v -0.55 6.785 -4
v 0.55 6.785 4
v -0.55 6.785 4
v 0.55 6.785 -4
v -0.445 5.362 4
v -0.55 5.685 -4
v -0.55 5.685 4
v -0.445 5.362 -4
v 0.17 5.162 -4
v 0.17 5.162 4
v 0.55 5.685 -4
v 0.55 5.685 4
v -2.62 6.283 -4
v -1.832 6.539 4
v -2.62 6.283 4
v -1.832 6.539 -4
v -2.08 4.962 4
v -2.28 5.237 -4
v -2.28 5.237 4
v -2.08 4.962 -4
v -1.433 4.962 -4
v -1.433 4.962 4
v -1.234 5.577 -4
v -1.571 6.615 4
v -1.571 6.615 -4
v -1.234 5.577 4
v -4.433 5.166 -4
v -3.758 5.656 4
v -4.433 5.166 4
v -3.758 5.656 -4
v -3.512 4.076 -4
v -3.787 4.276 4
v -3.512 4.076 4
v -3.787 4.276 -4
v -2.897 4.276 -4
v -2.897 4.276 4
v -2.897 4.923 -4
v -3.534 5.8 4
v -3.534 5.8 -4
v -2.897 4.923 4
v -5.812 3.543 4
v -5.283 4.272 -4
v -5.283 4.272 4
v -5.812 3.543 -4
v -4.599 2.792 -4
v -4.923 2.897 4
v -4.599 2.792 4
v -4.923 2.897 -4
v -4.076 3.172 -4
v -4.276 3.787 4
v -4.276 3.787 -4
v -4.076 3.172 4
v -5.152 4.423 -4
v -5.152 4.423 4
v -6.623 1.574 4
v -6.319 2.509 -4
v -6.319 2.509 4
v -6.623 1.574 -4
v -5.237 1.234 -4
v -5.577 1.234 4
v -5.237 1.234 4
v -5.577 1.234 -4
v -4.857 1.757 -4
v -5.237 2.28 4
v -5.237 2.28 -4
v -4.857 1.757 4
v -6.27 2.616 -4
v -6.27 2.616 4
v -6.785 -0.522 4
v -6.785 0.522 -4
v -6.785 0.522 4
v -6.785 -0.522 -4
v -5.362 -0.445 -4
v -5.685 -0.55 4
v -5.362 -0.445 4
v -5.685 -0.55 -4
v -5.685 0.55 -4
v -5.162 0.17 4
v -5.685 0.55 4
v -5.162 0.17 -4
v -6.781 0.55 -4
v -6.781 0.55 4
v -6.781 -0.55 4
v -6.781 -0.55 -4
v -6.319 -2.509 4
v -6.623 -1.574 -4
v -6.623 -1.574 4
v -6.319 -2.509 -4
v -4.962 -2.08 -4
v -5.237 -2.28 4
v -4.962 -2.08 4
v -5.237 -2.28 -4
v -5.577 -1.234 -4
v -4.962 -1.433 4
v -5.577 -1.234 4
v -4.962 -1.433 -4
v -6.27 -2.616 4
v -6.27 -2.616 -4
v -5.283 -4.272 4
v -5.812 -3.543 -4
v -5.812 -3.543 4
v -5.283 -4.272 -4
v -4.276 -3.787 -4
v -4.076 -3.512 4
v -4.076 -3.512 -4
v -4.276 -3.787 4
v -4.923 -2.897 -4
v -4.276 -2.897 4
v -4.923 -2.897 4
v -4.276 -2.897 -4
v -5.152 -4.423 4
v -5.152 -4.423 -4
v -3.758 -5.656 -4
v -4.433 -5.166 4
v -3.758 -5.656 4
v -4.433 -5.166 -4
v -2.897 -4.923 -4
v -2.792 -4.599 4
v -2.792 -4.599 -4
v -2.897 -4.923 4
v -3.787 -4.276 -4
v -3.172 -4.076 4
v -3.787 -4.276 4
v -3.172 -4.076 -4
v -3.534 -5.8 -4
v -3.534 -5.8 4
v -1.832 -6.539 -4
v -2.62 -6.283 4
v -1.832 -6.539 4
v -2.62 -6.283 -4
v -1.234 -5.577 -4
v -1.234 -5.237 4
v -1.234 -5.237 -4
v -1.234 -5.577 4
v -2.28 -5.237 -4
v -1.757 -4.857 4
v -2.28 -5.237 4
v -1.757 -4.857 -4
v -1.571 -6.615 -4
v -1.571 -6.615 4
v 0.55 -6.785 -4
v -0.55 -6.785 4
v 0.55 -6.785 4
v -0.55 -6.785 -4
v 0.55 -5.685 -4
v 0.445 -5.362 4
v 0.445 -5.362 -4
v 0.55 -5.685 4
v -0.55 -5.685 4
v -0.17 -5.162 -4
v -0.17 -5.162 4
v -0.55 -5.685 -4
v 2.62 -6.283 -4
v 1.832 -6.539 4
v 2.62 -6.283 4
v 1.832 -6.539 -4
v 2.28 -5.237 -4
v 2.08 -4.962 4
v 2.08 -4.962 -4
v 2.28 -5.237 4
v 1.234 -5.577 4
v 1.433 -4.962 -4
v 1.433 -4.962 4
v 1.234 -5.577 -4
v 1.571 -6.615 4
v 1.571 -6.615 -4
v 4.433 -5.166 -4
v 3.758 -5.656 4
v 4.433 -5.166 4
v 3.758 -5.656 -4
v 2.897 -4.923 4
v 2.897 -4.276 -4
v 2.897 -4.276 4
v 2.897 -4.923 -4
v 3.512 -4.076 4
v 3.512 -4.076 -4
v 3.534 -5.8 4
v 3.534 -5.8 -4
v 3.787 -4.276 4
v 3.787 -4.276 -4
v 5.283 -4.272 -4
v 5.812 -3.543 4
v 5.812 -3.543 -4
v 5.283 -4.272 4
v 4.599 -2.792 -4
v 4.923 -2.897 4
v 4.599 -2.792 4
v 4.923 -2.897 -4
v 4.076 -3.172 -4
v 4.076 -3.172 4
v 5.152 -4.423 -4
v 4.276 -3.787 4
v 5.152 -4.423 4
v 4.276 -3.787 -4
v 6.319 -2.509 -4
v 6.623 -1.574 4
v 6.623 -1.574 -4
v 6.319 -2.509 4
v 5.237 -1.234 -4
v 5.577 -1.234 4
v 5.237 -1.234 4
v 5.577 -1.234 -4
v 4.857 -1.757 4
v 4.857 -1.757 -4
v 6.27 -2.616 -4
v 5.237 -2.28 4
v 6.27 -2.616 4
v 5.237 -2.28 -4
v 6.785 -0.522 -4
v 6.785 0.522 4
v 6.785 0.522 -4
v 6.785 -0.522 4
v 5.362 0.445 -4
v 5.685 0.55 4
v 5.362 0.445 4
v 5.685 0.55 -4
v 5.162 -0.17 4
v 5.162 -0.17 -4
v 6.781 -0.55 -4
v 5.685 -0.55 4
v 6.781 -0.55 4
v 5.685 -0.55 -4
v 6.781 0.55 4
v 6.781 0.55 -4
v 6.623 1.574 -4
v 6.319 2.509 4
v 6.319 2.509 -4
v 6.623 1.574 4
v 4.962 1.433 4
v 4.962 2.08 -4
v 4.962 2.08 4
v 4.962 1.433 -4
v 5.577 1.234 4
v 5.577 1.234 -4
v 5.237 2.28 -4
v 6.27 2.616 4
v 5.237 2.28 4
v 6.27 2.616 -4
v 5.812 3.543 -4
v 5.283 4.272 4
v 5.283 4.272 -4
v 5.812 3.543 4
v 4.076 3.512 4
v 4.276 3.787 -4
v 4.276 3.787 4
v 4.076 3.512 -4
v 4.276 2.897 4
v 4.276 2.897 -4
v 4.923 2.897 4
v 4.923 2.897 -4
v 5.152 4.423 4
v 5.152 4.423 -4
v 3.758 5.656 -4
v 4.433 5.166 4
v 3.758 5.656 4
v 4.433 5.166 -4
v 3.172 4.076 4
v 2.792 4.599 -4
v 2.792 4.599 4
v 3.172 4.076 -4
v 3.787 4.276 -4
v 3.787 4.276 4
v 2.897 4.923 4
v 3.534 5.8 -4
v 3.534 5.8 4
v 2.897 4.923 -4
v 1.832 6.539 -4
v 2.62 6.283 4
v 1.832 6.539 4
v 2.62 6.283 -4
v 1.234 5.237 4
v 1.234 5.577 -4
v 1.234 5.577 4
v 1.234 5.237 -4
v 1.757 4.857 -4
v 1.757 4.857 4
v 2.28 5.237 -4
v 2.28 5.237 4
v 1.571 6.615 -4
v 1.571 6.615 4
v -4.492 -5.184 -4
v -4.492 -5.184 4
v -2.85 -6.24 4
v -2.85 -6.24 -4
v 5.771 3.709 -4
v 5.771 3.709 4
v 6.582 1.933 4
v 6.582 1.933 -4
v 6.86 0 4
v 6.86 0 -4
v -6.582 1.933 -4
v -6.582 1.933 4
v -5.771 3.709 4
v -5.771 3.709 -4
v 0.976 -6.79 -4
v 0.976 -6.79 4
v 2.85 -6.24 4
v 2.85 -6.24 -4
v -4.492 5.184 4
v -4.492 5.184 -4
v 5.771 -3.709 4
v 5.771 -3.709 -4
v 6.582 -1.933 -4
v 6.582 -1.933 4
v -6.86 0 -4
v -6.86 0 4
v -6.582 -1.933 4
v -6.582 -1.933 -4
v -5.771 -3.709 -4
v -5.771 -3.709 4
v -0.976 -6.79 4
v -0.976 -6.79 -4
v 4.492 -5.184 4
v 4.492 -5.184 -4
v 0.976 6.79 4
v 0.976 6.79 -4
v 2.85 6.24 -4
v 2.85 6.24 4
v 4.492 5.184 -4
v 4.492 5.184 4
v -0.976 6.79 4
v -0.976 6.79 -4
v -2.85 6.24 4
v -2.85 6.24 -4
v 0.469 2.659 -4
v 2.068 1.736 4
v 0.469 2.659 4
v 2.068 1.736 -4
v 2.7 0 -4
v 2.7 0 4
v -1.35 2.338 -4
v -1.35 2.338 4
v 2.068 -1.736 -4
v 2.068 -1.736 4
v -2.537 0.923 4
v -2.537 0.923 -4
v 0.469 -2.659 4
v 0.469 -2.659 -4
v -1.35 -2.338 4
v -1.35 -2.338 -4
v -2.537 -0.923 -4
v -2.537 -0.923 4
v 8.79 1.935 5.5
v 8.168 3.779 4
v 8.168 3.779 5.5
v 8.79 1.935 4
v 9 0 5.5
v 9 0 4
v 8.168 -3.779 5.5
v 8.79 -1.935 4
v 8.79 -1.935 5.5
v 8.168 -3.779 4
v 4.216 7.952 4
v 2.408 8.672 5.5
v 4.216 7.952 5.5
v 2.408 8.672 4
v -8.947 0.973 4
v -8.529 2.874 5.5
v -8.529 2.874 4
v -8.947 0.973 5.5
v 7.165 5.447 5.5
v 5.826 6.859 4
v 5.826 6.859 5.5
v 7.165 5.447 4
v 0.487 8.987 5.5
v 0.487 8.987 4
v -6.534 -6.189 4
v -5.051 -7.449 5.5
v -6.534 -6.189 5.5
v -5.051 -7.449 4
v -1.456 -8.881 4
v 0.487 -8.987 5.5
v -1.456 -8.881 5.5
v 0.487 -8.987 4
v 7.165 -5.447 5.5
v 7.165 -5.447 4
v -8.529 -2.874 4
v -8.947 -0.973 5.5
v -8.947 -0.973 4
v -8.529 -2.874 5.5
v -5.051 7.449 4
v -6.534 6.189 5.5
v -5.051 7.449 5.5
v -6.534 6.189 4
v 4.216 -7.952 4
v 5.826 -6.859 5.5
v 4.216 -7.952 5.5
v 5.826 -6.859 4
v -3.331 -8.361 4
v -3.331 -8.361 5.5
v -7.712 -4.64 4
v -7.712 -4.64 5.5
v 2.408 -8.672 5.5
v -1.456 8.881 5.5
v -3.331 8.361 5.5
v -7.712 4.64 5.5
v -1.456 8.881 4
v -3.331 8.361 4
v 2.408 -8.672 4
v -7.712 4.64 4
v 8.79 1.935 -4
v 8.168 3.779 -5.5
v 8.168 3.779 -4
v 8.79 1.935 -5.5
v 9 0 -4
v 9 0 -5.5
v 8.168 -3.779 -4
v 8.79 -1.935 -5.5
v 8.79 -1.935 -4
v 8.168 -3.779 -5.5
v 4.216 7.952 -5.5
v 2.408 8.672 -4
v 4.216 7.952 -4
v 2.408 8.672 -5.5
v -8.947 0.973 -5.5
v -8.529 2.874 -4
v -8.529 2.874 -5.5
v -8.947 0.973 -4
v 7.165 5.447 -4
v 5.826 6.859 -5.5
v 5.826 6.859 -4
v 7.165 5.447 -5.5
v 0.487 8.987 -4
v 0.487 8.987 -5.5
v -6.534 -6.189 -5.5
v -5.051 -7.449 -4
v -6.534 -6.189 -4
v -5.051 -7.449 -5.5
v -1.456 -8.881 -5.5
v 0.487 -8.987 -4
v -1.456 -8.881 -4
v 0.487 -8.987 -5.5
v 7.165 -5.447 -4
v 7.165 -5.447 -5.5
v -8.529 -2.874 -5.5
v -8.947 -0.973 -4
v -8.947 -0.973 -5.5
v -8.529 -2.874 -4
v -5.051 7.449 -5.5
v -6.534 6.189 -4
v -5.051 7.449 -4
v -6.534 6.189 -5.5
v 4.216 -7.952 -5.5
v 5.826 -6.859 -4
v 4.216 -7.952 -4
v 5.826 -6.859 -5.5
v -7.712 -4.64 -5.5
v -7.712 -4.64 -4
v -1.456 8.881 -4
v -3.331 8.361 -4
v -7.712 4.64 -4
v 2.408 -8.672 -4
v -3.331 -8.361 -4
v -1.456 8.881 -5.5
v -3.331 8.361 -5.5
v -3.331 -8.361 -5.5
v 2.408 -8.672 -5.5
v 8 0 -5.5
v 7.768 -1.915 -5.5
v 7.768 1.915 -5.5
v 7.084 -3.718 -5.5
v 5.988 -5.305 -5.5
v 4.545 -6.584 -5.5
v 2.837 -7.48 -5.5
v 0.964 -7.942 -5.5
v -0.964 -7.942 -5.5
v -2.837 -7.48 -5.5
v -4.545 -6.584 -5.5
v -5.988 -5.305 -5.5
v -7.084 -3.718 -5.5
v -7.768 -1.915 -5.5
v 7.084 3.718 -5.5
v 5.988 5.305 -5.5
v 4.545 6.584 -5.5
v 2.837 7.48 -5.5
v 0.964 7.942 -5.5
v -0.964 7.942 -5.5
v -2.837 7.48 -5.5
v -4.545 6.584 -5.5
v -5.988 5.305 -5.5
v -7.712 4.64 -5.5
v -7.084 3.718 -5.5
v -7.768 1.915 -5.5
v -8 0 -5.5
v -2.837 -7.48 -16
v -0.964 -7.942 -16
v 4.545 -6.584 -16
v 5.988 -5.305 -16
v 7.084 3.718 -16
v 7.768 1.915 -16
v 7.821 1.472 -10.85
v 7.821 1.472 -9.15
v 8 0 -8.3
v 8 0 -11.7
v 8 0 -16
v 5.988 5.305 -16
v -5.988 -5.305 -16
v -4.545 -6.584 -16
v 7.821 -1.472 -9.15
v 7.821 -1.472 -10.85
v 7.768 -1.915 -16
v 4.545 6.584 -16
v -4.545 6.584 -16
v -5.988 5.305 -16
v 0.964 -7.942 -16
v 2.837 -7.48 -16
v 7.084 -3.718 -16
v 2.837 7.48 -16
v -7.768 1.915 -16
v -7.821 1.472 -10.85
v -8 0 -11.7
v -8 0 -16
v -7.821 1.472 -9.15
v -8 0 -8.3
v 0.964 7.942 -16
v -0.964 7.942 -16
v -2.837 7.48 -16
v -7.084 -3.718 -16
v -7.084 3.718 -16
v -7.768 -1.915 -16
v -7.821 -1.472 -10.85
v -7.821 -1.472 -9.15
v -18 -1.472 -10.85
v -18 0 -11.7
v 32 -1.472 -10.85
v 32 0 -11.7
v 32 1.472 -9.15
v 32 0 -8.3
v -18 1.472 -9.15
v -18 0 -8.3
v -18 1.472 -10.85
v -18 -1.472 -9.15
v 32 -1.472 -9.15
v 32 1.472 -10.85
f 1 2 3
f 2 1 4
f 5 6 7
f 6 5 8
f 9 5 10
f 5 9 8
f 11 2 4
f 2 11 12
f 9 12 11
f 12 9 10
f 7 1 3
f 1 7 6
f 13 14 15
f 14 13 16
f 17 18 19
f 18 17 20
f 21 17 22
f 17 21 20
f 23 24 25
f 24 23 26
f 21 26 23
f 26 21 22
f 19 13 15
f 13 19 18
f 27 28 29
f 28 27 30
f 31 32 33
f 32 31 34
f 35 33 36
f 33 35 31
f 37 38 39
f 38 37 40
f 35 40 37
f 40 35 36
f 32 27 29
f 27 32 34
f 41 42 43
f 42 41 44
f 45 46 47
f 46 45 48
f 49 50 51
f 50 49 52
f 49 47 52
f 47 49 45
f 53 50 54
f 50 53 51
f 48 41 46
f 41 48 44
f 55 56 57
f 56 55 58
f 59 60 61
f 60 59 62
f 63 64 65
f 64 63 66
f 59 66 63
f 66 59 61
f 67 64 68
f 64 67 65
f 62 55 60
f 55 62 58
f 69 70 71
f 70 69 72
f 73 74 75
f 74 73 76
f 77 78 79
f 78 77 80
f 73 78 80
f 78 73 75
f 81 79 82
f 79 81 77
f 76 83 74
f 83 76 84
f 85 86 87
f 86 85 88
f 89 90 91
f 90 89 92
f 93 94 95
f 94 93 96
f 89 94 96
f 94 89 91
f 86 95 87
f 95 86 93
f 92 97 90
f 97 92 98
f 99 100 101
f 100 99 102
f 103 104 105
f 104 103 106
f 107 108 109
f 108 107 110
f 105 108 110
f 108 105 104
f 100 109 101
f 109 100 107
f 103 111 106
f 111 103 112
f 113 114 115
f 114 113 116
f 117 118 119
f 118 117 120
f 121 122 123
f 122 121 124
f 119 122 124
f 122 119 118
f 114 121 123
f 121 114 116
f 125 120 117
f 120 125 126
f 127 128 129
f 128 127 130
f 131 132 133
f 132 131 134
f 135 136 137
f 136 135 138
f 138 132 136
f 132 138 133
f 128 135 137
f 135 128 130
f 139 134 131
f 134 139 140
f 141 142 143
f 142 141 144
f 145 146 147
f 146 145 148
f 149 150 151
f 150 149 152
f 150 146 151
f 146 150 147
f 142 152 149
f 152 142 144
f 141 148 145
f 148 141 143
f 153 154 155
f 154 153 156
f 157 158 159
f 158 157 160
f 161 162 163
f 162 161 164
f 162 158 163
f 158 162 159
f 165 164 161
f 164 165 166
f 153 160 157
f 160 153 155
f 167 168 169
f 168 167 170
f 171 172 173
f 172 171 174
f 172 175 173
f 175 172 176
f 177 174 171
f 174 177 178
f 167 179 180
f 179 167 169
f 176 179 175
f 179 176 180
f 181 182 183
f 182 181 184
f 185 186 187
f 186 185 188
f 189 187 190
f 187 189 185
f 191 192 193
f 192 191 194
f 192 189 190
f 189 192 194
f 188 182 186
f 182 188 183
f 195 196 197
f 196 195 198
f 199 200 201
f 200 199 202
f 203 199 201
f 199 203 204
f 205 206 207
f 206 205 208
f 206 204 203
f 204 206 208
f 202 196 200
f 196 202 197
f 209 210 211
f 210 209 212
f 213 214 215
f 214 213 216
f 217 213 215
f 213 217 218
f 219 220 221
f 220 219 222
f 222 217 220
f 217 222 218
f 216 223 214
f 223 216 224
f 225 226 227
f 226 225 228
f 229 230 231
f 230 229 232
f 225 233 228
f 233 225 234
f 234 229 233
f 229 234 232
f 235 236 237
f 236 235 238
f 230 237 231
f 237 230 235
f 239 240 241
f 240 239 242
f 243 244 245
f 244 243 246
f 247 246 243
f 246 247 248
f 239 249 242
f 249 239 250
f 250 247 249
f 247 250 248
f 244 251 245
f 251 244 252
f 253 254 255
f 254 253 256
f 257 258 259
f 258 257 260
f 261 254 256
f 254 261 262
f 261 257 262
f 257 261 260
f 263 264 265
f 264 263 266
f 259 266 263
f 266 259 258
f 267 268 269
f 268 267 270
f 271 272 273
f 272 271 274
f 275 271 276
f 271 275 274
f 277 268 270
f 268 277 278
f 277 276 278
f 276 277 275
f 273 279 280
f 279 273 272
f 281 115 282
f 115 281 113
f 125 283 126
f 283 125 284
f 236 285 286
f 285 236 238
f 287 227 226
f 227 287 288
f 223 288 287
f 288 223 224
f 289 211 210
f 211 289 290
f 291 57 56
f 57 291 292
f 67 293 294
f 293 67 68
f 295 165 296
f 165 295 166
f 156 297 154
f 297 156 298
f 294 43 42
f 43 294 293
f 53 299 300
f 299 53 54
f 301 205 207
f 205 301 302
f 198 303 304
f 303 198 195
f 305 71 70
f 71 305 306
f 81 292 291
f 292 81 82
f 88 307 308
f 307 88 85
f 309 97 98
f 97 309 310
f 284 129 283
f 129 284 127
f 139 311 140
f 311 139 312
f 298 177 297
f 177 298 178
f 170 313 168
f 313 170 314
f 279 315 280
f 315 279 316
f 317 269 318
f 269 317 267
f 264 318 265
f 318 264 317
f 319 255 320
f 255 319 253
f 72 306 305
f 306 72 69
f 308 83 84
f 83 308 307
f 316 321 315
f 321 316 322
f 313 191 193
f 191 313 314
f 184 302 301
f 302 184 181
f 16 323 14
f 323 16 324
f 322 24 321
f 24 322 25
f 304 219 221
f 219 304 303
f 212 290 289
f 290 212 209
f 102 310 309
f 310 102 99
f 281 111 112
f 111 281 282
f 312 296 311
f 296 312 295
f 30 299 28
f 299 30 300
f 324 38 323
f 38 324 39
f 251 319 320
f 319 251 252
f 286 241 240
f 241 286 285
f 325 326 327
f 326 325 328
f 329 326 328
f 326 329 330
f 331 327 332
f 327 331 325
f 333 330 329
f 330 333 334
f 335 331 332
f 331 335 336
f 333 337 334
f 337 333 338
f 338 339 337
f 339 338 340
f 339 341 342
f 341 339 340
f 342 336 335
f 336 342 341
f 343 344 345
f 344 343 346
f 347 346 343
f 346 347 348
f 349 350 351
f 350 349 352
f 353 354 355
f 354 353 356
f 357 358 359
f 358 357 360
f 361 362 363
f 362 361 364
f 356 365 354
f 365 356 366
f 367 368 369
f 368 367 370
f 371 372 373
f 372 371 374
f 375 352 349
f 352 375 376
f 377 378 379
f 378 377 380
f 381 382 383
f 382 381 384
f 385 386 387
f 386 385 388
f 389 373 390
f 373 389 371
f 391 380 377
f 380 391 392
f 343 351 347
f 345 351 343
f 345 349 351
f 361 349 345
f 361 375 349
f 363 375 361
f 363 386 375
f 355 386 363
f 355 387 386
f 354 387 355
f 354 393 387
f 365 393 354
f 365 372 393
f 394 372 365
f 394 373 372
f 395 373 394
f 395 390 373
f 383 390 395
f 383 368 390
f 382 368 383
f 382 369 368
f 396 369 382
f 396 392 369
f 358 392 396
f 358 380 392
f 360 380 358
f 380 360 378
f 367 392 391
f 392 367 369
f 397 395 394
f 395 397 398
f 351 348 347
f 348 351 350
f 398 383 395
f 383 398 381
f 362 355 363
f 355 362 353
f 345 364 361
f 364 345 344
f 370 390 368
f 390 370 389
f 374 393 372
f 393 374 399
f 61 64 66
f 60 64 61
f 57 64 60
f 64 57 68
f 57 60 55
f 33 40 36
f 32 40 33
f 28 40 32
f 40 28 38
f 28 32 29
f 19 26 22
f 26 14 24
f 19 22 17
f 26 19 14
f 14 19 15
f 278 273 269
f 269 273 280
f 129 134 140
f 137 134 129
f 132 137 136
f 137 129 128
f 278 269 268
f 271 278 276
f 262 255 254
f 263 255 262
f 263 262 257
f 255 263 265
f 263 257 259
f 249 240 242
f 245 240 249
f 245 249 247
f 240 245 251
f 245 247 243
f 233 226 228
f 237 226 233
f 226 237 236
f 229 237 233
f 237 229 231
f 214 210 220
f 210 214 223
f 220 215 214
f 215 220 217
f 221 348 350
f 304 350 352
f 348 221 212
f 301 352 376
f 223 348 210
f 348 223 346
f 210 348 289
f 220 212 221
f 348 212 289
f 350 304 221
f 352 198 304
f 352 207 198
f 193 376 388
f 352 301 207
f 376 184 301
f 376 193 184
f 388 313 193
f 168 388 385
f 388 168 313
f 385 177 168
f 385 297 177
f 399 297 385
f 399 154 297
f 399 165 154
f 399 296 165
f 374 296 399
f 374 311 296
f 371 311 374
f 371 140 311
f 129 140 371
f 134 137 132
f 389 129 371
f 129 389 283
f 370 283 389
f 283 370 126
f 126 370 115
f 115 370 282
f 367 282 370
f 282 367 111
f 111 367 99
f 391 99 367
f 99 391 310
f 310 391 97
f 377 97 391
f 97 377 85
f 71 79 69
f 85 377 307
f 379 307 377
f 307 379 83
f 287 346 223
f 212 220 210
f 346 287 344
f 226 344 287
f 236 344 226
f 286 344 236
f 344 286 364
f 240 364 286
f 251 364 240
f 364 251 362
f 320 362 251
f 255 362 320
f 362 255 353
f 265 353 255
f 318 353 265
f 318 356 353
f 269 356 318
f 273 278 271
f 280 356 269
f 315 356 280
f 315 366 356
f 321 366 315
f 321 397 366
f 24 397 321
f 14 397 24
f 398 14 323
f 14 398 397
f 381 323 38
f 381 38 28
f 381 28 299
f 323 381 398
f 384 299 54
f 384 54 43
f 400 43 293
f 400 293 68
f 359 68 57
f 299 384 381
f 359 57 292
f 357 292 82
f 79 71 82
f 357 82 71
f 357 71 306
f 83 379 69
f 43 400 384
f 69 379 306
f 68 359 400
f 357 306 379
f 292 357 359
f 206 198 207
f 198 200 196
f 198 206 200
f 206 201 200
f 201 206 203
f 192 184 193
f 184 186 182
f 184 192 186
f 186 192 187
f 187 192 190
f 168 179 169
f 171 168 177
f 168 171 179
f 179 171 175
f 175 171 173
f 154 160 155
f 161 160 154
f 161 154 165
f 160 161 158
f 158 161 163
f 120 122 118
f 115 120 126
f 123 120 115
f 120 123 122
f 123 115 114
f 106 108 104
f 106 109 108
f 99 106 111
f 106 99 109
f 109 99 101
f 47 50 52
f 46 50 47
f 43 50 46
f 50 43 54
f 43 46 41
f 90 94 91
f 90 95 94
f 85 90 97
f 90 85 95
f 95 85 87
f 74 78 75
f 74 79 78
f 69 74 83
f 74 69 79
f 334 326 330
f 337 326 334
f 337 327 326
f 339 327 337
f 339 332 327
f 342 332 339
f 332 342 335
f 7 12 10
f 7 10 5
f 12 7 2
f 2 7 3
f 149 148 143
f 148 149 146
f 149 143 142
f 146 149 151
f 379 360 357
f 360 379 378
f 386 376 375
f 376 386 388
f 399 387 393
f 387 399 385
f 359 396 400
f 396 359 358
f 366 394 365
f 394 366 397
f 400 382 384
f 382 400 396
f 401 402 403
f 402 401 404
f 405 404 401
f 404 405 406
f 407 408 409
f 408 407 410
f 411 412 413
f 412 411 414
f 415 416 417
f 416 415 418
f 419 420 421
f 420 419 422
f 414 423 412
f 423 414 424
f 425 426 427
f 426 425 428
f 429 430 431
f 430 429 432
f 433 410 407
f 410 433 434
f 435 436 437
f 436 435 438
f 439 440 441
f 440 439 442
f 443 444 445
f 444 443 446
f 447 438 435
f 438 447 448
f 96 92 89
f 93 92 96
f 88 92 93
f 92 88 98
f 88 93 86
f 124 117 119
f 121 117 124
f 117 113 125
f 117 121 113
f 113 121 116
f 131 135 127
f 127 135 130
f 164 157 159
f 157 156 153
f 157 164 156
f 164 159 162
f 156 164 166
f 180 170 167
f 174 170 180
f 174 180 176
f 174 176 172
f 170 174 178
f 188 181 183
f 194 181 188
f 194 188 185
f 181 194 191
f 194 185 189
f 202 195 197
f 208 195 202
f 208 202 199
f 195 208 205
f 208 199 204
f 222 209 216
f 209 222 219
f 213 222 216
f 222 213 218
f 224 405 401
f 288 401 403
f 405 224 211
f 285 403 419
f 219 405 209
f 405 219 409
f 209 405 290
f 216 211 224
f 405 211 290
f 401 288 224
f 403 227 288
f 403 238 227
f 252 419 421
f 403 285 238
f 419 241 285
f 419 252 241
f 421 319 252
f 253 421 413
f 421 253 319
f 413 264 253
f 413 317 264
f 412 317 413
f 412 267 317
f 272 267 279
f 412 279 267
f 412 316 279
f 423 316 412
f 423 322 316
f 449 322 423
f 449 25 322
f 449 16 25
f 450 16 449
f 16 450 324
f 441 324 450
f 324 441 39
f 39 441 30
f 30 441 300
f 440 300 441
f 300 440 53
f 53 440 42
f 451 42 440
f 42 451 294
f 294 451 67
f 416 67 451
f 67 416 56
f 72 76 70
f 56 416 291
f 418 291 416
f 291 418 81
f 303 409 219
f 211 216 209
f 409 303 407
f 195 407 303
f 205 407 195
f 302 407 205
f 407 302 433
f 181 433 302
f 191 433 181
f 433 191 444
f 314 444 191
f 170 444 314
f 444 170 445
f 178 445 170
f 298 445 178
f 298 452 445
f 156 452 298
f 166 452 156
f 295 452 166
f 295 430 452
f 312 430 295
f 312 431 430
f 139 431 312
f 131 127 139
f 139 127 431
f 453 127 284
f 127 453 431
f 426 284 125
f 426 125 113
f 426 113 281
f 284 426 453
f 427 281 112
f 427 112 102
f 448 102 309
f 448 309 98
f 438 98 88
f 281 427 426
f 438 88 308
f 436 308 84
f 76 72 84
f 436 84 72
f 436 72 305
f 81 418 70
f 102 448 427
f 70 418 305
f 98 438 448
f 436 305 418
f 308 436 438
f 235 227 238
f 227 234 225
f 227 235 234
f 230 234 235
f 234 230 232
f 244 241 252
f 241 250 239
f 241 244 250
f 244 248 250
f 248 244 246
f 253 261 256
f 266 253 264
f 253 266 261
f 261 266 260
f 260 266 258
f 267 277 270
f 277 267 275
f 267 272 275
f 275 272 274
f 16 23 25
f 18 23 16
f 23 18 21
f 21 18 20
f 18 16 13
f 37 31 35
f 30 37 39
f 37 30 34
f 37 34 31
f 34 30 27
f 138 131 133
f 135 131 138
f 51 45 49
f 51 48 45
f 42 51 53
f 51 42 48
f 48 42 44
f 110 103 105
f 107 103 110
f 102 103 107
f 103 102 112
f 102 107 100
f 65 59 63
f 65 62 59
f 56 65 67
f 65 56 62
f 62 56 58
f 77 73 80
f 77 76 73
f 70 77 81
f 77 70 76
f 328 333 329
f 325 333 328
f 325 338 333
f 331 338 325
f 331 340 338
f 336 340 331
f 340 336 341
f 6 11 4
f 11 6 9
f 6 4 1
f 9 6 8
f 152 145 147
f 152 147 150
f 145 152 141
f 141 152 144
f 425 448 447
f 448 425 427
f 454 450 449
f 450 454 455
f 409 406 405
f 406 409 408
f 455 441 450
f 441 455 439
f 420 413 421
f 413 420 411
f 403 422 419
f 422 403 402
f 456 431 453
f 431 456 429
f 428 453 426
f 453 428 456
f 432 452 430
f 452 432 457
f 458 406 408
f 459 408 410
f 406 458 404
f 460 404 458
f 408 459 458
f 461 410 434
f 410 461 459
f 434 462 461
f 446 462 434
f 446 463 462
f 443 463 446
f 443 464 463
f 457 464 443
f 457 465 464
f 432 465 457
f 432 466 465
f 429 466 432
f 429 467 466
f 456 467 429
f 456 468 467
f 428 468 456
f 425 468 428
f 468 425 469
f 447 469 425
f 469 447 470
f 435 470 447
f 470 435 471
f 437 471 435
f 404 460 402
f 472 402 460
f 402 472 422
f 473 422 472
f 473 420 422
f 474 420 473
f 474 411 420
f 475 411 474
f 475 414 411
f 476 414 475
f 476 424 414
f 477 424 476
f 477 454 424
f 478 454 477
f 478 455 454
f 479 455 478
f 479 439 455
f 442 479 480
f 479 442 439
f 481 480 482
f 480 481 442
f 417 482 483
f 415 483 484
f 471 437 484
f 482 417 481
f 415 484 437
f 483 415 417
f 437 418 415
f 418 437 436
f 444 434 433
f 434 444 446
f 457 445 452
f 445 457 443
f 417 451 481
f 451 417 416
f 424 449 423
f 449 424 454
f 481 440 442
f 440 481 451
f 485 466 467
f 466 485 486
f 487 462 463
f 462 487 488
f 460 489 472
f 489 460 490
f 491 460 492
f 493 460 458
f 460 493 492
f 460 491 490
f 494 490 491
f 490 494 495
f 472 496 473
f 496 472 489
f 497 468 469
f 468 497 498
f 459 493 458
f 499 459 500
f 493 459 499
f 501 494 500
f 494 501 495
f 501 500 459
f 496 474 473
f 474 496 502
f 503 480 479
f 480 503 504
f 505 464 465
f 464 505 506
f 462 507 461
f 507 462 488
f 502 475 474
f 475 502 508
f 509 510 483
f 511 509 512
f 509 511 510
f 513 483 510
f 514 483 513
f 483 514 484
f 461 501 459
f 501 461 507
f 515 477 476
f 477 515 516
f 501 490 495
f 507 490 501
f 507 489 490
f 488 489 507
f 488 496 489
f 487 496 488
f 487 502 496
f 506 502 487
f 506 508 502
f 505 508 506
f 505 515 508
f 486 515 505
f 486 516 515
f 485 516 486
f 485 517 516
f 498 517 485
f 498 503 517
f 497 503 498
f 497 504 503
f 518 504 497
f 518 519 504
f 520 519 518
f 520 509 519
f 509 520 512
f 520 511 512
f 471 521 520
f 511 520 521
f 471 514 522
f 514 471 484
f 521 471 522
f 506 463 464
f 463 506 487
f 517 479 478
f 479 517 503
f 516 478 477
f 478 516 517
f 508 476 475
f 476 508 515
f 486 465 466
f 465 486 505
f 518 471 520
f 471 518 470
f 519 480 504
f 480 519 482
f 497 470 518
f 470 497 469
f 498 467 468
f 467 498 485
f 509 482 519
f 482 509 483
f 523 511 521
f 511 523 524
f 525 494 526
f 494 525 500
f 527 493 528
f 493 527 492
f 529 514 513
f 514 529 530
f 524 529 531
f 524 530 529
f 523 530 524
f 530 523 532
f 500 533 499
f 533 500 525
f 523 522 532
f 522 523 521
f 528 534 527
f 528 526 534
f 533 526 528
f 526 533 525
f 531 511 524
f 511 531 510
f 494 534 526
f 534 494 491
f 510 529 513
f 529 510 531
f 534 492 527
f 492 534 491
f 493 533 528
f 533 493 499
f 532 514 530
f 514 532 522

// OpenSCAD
// Parameters
tooth_count = 20; //[10:60:1]
pitch_diameter_mm = 12.22; //[6.11:24.44:0.01]
pitch_radius_mm = 6.11; //[3.055:12.22:0.01]
pulley_width_mm = 10; //[5:30:0.5]
bore_diameter_mm = 5; //[2:12:0.1]
hub_diameter_mm = 16; //[8:32:0.5]
hub_length_mm = 12; //[0:30:0.5]
flange_diameter_mm = 18; //[10:40:0.5]
flange_thickness_mm = 1.5; //[0:5:0.1]
set_screw_count = 1; //[0:4:1]
set_screw_diameter_mm = 3; //[1.5:6:0.1]
set_screw_z_offset_mm = 0; //[-20:20:0.5]
tooth_standard = 2; //[1:5:1]
tooth_pitch_mm = 2; //[1:5:0.01]
tooth_depth_mm = 0.75; //[0.3:2:0.01]
tooth_width_mm = 1.2; //[0.6:3:0.01]
tolerances_mm = 0.2; //[0:0.6:0.01]
tooth_root_radius_mm = 0.55; //[0.2:1.2:0.01]
tooth_overlap_mm = 0.8; //[0.2:2:0.01]
connection_overlap_mm = 1; //[0.5:2:0.1]
set_screw_length_mm = 50; //[20:120:1]

// Pulley - complete geometry
module pulley() {
  color("Silver") {
    // Toothed pulley body
    difference() {
      cylinder(h=pulley_width_mm, r=pitch_radius_mm + tooth_depth_mm, center=true);
      printed_pulley_teeth();
      // Central bore
      cylinder(h=pulley_width_mm + hub_length_mm + 2*flange_thickness_mm + 4*connection_overlap_mm, 
               r=(bore_diameter_mm + 2*tolerances_mm)/2, center=true);
    }
    // Hub
    if (hub_length_mm > 0) {
      translate([0, 0, -(pulley_width_mm/2 + hub_length_mm/2 - connection_overlap_mm)])
        cylinder(h=hub_length_mm, r=hub_diameter_mm/2, center=true);
    }
    // Flanges
    if (flange_thickness_mm > 0) {
      translate([0, 0, pulley_width_mm/2 + flange_thickness_mm/2 - connection_overlap_mm])
        cylinder(h=flange_thickness_mm, r=flange_diameter_mm/2, center=true);
      translate([0, 0, -(pulley_width_mm/2 + flange_thickness_mm/2 - connection_overlap_mm)])
        cylinder(h=flange_thickness_mm, r=flange_diameter_mm/2, center=true);
    }
    // Set screw holes
    if (set_screw_count > 0) {
      for (i = [0:set_screw_count-1]) {
        rotate([0, 0, i*360/set_screw_count])
          translate([hub_diameter_mm/2 - connection_overlap_mm, 0, 
                     -(pulley_width_mm/2 + hub_length_mm/2 - connection_overlap_mm) + set_screw_z_offset_mm])
            rotate([0, 90, 0])
              cylinder(h=set_screw_length_mm, r=(set_screw_diameter_mm + 2*tolerances_mm)/2, center=true);
      }
    }
  }
}

// Printed Pulley Teeth - complete geometry
module printed_pulley_teeth() {
  for (i = [0:tooth_count-1]) {
    rotate([0, 0, i*360/tooth_count]) {
      translate([0, (pitch_radius_mm + tooth_depth_mm) - (tooth_depth_mm/2) - tooth_overlap_mm, 0])
        printed_pulley_teeth_from_profile();
    }
  }
}

// Printed Pulley Teeth From Profile - complete geometry
module printed_pulley_teeth_from_profile() {
  hull() {
    translate([0, tooth_root_radius_mm, 0])
      linear_extrude(height=pulley_width_mm + 2*connection_overlap_mm, center=true)
        square([2*tooth_root_radius_mm, 2*tooth_root_radius_mm], center=true);
    linear_extrude(height=pulley_width_mm + 2*connection_overlap_mm, center=true)
      circle(r=tooth_root_radius_mm);
  }
}

// Printed Pulley GT2 Teeth - complete geometry
module printed_pulley_GT2_teeth() {
  printed_pulley_teeth();
}

// Assembly
module assembly() {
  pulley();
}

assembly();
